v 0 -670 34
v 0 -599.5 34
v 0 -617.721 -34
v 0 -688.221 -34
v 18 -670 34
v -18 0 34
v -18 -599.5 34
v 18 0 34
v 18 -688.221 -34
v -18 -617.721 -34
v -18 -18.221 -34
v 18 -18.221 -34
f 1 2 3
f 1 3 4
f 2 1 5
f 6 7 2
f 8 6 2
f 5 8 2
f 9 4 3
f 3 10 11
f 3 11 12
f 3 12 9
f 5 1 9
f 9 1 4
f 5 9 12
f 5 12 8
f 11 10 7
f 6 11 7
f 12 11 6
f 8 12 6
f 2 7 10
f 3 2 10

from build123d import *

# Parameters (mm, degrees)
F0_W     = 36
F0_H     = 68
F1_DEPTH = 750
F3_DEPTH = 36
F5_DEPTH = 18


with BuildPart() as f1:
    # F0 (on Front) → F1 (new body)
    with BuildSketch(Plane.XZ):
        Rectangle(F0_W, F0_H)
    extrude(amount=F1_DEPTH)

    # F2 (on face) → F3 (cut, through all)
    with BuildSketch(Plane(origin=(-18, 0, 0), x_dir=(0, -1, 0), z_dir=(-1, 0, 0))):
        Polygon((18.220545, -34), (0, 34), (0, -34), align=None)
        Polygon((750, 34), (670, 34), (688.220545, -34), (750, -34), align=None)
    extrude(amount=-F3_DEPTH, mode=Mode.SUBTRACT)

    # F4 (on face) → F5 (cut)
    with BuildSketch(Plane(origin=(-18, 0, 0), x_dir=(0, -1, 0), z_dir=(-1, 0, 0))):
        Polygon((670, 34), (599.5, 34), (617.720545, -34), (688.220545, -34), align=None)
    extrude(amount=-F5_DEPTH, mode=Mode.SUBTRACT)


solid = f1.part
